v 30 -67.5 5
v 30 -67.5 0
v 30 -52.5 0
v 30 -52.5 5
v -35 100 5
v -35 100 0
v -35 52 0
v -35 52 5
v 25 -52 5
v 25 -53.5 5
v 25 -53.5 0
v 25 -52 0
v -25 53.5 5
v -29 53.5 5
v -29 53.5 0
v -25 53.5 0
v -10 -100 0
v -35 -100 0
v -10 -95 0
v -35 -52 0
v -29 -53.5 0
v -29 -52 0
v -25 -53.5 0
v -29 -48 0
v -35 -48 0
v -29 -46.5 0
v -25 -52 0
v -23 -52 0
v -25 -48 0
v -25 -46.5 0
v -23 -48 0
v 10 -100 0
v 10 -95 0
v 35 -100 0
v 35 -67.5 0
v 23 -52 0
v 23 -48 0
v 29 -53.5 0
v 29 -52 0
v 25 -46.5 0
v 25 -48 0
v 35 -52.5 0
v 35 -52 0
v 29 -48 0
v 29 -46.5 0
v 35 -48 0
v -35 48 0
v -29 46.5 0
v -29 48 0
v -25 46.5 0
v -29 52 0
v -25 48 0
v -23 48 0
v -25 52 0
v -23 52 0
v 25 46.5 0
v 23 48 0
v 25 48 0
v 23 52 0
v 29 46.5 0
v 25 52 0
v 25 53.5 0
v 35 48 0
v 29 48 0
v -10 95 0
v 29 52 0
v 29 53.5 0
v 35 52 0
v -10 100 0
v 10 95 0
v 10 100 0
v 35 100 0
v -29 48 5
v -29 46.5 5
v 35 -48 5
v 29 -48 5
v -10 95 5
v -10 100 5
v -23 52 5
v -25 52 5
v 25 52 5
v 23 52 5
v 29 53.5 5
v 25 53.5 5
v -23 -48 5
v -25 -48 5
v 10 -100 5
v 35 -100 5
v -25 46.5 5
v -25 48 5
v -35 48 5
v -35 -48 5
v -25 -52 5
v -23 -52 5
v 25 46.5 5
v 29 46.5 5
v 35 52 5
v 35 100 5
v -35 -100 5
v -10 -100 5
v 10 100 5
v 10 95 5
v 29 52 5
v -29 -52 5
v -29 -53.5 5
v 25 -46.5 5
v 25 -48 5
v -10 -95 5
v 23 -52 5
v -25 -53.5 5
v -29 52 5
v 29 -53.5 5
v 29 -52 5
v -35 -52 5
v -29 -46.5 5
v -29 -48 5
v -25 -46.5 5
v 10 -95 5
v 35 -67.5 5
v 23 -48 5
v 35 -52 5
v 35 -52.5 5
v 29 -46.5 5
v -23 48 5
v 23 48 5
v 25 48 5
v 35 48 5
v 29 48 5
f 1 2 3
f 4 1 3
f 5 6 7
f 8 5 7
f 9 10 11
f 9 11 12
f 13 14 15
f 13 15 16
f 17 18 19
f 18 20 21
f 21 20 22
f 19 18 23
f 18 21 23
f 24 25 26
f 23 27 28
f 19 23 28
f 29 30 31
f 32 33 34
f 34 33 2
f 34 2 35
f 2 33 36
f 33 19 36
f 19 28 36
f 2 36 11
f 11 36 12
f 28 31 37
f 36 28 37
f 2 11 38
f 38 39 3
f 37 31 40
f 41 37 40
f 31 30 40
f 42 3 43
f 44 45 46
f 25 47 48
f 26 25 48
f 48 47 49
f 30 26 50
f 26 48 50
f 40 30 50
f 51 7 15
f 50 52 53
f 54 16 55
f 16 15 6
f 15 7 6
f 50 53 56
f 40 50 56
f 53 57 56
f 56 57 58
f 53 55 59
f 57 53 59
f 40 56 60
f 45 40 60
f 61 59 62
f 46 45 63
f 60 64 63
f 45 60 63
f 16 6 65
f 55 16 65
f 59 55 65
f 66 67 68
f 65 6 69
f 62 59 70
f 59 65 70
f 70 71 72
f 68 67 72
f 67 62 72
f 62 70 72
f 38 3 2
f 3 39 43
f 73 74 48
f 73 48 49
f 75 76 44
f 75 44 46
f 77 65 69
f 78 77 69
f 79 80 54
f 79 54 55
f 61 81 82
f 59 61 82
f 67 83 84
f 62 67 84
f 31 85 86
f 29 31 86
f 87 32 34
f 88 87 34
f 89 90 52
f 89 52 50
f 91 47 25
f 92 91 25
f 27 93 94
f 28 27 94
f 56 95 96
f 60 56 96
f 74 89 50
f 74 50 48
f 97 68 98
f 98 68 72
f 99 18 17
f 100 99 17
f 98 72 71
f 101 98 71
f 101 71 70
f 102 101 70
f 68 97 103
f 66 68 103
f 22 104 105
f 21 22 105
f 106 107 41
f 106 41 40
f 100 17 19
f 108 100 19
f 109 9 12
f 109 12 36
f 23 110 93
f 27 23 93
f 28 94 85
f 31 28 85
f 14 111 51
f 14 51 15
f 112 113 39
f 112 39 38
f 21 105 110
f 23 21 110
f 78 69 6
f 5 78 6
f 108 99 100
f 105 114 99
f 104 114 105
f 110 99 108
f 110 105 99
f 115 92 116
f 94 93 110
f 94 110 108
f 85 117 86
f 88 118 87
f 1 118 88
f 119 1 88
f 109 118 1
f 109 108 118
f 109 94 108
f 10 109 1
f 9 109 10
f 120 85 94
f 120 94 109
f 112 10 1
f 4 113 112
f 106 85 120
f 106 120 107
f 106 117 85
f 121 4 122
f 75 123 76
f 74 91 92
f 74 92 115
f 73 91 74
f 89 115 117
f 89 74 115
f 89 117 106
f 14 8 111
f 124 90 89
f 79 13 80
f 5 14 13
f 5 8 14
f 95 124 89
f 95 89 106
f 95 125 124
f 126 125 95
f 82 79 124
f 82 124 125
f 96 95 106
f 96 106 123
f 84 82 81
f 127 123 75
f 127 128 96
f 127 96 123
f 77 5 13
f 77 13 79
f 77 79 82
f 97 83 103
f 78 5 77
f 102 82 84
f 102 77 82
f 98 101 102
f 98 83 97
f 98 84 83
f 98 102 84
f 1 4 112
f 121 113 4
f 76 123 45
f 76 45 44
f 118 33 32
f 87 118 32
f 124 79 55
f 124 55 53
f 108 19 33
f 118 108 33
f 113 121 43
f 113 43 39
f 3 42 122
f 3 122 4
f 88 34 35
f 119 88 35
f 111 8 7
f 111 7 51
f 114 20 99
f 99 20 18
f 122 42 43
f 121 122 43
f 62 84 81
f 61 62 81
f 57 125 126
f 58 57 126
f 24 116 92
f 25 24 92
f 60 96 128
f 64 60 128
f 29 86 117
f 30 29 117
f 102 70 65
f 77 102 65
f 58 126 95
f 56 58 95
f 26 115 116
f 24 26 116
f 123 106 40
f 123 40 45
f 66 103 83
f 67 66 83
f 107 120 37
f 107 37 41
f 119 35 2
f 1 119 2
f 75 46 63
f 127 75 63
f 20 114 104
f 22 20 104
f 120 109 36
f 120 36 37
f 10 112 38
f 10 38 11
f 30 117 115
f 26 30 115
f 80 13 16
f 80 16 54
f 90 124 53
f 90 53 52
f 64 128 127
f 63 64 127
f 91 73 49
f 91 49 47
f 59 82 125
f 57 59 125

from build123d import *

# Parameters (mm, degrees)
BOSS_EXTRUDE1_DEPTH  = 5
CUT_EXTRUDE1_DEPTH   = 10
MIRROR2_COPY_1_DEPTH = 10
SKETCH4_W            = 5
SKETCH4_H            = 15
CUT_EXTRUDE2_DEPTH   = 10


with BuildPart() as part:
    # Sketch2 → Boss-Extrude1 (new body)
    with BuildSketch(Plane.XY):
        Polygon((-10, 100), (-35, 100), (-35, -100), (-10, -100), (-10, -95), (10, -95), (10, -100), (35, -100), (35, 100), (10, 100), (10, 95), (-10, 95), align=None)
    extrude(amount=BOSS_EXTRUDE1_DEPTH)

    # Sketch3 → Cut-Extrude1 (cut)
    with BuildSketch(Plane.XY.offset(5)):
        Polygon((35, -52), (29, -52), (29, -53.5), (25, -53.5), (25, -52), (23, -52), (23, -48), (25, -48), (25, -46.5), (29, -46.5), (29, -48), (35, -48), align=None)
    cut_extrude1 = extrude(amount=-CUT_EXTRUDE1_DEPTH, mode=Mode.SUBTRACT)

    # Mirror1: Cut-Extrude1 across plane
    add(cut_extrude1.mirror(Plane.ZX), mode=Mode.SUBTRACT)

    # Mirror2: Cut-Extrude1 across plane
    add(cut_extrude1.mirror(Plane(origin=(0, 0, 0), x_dir=(0, 0, 1), z_dir=(1, 0, 0))), mode=Mode.SUBTRACT)

    # Mirror2 copy 1 sketch → Mirror2 copy 1 (cut)
    with BuildSketch(Plane(origin=(0, 0, 5), x_dir=(-1, 0, 0), z_dir=(0, 0, 1))):
        Polygon((35, -52), (29, -52), (29, -53.5), (25, -53.5), (25, -52), (23, -52), (23, -48), (25, -48), (25, -46.5), (29, -46.5), (29, -48), (35, -48), align=None)
    extrude(amount=-MIRROR2_COPY_1_DEPTH, mode=Mode.SUBTRACT)

    # Sketch4 → Cut-Extrude2 (cut)
    with BuildSketch(Plane(origin=(0, 0, 0), x_dir=(-1, 0, 0), z_dir=(0, 0, -1))):
        with Locations((-32.5, -60)):
            Rectangle(SKETCH4_W, SKETCH4_H)
    extrude(amount=-CUT_EXTRUDE2_DEPTH, mode=Mode.SUBTRACT)


solid = part.part
